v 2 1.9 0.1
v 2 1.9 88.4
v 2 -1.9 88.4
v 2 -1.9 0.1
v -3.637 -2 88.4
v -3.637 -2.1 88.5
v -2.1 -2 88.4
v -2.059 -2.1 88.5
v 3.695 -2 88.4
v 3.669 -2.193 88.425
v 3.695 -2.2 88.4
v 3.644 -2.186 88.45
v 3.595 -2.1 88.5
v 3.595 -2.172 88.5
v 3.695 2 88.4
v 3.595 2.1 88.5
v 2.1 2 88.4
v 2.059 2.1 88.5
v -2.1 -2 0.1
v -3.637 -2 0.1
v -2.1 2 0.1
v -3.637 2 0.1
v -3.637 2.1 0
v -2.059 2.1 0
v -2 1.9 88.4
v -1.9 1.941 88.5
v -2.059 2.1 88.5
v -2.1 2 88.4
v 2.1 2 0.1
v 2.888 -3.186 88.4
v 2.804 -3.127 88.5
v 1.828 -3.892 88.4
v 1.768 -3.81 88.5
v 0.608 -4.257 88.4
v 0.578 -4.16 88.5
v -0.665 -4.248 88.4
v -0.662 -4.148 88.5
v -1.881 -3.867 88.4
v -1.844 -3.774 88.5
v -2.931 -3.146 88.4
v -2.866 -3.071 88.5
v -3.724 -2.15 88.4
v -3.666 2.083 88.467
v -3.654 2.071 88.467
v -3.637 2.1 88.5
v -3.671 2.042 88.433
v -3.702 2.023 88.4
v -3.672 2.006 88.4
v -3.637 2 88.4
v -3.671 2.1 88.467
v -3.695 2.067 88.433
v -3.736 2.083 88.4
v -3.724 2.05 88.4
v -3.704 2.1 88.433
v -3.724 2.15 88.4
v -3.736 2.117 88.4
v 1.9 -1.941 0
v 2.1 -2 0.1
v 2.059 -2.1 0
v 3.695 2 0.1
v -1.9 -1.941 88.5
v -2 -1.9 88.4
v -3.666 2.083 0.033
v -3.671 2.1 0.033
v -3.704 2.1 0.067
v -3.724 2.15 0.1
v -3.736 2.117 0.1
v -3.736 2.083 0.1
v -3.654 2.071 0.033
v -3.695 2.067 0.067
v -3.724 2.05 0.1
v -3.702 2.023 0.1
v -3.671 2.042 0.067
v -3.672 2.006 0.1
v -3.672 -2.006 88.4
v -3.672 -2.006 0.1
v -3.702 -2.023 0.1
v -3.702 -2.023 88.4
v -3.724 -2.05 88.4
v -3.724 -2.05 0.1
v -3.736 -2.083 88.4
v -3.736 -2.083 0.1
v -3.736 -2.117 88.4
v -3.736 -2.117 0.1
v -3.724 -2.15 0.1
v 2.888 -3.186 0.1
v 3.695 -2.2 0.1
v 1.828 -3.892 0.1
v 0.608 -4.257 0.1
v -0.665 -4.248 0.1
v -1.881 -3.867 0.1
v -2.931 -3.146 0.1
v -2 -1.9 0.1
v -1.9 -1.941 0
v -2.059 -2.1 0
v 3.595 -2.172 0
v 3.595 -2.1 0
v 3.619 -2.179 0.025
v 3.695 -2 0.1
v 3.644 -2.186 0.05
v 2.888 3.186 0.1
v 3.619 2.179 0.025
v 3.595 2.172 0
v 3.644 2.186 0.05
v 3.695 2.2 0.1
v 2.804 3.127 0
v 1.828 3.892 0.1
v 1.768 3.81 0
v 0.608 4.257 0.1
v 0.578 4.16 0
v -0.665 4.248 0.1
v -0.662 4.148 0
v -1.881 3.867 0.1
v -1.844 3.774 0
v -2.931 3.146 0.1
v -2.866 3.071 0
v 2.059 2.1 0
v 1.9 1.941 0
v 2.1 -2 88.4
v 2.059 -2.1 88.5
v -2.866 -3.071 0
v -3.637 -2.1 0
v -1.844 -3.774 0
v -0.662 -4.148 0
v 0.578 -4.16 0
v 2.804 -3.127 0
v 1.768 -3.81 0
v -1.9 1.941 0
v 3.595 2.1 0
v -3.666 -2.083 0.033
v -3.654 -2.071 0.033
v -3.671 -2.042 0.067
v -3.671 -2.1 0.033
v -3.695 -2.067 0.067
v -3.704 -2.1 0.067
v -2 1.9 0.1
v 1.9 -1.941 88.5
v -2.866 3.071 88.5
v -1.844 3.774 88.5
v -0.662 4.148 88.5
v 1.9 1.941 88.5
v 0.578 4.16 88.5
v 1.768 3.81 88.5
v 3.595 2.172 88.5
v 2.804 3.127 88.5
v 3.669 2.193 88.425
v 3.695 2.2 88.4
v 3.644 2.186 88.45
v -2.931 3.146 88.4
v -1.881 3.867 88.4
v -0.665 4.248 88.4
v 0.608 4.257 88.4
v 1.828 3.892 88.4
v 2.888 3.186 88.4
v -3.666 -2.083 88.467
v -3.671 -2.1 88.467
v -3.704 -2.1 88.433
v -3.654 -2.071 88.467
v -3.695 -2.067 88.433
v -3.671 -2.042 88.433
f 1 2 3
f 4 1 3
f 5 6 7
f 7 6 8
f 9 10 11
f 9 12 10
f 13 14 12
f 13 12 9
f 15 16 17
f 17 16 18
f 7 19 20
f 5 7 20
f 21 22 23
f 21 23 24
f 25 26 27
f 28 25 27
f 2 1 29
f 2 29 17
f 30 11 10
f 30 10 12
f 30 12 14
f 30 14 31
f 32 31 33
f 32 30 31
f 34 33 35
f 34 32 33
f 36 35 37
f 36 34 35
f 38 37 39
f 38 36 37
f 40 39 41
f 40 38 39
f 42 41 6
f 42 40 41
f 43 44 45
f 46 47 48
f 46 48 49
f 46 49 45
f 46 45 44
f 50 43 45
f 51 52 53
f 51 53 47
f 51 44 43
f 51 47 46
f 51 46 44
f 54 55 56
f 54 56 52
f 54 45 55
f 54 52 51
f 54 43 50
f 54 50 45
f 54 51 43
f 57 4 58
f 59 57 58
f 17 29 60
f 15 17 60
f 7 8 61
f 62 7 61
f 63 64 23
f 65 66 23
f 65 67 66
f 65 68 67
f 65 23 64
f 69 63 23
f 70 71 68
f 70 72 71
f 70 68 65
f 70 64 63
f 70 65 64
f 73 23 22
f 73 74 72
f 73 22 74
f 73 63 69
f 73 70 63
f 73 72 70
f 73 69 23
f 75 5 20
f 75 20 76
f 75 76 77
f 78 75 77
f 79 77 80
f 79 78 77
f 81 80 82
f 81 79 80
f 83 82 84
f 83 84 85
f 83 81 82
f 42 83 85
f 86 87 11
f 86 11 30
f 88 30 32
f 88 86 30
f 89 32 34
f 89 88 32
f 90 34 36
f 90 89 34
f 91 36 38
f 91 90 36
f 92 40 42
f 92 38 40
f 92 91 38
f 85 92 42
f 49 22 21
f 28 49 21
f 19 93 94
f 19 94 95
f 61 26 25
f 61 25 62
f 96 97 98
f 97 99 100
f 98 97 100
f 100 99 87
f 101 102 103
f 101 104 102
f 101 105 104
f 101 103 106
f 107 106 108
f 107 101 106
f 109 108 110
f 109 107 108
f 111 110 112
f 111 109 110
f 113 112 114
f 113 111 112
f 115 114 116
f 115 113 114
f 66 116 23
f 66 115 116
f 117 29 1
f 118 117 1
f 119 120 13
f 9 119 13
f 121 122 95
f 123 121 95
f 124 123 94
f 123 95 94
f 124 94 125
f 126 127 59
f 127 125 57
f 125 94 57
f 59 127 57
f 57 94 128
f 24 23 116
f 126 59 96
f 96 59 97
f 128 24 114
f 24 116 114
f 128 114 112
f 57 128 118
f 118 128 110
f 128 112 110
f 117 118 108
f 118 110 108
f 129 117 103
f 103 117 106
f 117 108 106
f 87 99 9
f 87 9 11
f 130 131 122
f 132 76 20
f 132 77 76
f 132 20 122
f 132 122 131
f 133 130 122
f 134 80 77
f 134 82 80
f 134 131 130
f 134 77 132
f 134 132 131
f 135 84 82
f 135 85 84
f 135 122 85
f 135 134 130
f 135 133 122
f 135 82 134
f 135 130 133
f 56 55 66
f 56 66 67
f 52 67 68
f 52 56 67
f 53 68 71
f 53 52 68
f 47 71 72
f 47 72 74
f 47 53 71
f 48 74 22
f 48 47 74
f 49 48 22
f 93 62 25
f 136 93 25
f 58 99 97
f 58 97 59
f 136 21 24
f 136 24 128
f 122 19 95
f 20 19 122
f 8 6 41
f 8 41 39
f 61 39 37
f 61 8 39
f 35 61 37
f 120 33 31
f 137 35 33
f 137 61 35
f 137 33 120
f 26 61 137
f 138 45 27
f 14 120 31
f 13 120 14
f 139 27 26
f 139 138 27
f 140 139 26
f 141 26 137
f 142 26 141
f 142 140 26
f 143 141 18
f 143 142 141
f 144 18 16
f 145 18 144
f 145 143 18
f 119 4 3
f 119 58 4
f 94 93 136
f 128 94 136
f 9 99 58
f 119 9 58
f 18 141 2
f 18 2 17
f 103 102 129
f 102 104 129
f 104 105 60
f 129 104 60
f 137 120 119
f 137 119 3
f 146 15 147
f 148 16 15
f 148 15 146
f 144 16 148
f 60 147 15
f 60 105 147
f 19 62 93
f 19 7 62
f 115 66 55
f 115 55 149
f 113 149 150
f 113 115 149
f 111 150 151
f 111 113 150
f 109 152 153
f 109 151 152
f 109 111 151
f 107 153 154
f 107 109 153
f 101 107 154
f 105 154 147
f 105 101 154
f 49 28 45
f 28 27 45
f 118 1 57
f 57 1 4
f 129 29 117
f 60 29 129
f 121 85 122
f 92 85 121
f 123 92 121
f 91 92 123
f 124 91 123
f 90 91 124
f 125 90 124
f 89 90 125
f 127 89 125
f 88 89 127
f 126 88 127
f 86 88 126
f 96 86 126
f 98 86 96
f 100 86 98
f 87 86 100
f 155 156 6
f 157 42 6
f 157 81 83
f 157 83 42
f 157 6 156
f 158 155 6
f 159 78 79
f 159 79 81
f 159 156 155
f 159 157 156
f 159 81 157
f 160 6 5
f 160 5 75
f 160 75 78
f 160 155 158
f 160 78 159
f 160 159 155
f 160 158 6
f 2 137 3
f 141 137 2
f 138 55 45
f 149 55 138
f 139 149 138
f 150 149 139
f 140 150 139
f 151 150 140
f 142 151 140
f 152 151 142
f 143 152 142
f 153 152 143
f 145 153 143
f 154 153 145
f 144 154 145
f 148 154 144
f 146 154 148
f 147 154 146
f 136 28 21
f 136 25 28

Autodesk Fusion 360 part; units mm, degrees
sketch "Profil" plane through (0, 0, 0) normal (0, 0, 1) x (1, 0, 0)
  circle A0 centre (0, 0) radius 4.3
  line L0 (3.8066, -2) -> (-3.8066, -2)
  line L1 (-3.8066, -2) -> (-3.8066, 2)
  line L2 (-3.8066, 2) -> (3.8066, 2)
  line L3 (3.8066, 2) -> (3.8066, -2)
  line L4 (3.8066, -2) -> (-3.8066, 2) construction
  line L5 (-3.8066, -2) -> (3.8066, 2) construction
  line L6 (2, -2) -> (-2, -2)
  line L7 (-2, -2) -> (-2, 2)
  line L8 (-2, 2) -> (2, 2)
  line L9 (2, 2) -> (2, -2)
  line L10 (2, -2) -> (-2, 2) construction
  line L11 (-2, -2) -> (2, 2) construction
  line L12 (3.6946, 2.2) -> (3.6946, -2.2)
  dimension "d1" = 8.6
  dimension "d2" = 4
  dimension "d3" = 4
  dimension "d4" = 0.2
extrude "Extrude1" add sketch "Profil" along normal blind 88.5 contours A0 L2 L8 L12 | A0 L0 L6 L12 | L0 L2 L6 L7 L8 L9
fillet "Fillet1" radius 0.1 2 edges at (-3.8066, 2, 44.25) (-3.8066, -2, 44.25)
chamfer "Chamfer1" distance 0.1 angle 45 4 edges at (-2, -2, 44.25) (-2, 2, 44.25) (2, -2, 44.25) (2, 2, 44.25)
chamfer "Chamfer2" distance 0.1 angle 45 2 faces at (0.6667, -0.6333, 88.5) (0.6667, -0.6333, 0)
